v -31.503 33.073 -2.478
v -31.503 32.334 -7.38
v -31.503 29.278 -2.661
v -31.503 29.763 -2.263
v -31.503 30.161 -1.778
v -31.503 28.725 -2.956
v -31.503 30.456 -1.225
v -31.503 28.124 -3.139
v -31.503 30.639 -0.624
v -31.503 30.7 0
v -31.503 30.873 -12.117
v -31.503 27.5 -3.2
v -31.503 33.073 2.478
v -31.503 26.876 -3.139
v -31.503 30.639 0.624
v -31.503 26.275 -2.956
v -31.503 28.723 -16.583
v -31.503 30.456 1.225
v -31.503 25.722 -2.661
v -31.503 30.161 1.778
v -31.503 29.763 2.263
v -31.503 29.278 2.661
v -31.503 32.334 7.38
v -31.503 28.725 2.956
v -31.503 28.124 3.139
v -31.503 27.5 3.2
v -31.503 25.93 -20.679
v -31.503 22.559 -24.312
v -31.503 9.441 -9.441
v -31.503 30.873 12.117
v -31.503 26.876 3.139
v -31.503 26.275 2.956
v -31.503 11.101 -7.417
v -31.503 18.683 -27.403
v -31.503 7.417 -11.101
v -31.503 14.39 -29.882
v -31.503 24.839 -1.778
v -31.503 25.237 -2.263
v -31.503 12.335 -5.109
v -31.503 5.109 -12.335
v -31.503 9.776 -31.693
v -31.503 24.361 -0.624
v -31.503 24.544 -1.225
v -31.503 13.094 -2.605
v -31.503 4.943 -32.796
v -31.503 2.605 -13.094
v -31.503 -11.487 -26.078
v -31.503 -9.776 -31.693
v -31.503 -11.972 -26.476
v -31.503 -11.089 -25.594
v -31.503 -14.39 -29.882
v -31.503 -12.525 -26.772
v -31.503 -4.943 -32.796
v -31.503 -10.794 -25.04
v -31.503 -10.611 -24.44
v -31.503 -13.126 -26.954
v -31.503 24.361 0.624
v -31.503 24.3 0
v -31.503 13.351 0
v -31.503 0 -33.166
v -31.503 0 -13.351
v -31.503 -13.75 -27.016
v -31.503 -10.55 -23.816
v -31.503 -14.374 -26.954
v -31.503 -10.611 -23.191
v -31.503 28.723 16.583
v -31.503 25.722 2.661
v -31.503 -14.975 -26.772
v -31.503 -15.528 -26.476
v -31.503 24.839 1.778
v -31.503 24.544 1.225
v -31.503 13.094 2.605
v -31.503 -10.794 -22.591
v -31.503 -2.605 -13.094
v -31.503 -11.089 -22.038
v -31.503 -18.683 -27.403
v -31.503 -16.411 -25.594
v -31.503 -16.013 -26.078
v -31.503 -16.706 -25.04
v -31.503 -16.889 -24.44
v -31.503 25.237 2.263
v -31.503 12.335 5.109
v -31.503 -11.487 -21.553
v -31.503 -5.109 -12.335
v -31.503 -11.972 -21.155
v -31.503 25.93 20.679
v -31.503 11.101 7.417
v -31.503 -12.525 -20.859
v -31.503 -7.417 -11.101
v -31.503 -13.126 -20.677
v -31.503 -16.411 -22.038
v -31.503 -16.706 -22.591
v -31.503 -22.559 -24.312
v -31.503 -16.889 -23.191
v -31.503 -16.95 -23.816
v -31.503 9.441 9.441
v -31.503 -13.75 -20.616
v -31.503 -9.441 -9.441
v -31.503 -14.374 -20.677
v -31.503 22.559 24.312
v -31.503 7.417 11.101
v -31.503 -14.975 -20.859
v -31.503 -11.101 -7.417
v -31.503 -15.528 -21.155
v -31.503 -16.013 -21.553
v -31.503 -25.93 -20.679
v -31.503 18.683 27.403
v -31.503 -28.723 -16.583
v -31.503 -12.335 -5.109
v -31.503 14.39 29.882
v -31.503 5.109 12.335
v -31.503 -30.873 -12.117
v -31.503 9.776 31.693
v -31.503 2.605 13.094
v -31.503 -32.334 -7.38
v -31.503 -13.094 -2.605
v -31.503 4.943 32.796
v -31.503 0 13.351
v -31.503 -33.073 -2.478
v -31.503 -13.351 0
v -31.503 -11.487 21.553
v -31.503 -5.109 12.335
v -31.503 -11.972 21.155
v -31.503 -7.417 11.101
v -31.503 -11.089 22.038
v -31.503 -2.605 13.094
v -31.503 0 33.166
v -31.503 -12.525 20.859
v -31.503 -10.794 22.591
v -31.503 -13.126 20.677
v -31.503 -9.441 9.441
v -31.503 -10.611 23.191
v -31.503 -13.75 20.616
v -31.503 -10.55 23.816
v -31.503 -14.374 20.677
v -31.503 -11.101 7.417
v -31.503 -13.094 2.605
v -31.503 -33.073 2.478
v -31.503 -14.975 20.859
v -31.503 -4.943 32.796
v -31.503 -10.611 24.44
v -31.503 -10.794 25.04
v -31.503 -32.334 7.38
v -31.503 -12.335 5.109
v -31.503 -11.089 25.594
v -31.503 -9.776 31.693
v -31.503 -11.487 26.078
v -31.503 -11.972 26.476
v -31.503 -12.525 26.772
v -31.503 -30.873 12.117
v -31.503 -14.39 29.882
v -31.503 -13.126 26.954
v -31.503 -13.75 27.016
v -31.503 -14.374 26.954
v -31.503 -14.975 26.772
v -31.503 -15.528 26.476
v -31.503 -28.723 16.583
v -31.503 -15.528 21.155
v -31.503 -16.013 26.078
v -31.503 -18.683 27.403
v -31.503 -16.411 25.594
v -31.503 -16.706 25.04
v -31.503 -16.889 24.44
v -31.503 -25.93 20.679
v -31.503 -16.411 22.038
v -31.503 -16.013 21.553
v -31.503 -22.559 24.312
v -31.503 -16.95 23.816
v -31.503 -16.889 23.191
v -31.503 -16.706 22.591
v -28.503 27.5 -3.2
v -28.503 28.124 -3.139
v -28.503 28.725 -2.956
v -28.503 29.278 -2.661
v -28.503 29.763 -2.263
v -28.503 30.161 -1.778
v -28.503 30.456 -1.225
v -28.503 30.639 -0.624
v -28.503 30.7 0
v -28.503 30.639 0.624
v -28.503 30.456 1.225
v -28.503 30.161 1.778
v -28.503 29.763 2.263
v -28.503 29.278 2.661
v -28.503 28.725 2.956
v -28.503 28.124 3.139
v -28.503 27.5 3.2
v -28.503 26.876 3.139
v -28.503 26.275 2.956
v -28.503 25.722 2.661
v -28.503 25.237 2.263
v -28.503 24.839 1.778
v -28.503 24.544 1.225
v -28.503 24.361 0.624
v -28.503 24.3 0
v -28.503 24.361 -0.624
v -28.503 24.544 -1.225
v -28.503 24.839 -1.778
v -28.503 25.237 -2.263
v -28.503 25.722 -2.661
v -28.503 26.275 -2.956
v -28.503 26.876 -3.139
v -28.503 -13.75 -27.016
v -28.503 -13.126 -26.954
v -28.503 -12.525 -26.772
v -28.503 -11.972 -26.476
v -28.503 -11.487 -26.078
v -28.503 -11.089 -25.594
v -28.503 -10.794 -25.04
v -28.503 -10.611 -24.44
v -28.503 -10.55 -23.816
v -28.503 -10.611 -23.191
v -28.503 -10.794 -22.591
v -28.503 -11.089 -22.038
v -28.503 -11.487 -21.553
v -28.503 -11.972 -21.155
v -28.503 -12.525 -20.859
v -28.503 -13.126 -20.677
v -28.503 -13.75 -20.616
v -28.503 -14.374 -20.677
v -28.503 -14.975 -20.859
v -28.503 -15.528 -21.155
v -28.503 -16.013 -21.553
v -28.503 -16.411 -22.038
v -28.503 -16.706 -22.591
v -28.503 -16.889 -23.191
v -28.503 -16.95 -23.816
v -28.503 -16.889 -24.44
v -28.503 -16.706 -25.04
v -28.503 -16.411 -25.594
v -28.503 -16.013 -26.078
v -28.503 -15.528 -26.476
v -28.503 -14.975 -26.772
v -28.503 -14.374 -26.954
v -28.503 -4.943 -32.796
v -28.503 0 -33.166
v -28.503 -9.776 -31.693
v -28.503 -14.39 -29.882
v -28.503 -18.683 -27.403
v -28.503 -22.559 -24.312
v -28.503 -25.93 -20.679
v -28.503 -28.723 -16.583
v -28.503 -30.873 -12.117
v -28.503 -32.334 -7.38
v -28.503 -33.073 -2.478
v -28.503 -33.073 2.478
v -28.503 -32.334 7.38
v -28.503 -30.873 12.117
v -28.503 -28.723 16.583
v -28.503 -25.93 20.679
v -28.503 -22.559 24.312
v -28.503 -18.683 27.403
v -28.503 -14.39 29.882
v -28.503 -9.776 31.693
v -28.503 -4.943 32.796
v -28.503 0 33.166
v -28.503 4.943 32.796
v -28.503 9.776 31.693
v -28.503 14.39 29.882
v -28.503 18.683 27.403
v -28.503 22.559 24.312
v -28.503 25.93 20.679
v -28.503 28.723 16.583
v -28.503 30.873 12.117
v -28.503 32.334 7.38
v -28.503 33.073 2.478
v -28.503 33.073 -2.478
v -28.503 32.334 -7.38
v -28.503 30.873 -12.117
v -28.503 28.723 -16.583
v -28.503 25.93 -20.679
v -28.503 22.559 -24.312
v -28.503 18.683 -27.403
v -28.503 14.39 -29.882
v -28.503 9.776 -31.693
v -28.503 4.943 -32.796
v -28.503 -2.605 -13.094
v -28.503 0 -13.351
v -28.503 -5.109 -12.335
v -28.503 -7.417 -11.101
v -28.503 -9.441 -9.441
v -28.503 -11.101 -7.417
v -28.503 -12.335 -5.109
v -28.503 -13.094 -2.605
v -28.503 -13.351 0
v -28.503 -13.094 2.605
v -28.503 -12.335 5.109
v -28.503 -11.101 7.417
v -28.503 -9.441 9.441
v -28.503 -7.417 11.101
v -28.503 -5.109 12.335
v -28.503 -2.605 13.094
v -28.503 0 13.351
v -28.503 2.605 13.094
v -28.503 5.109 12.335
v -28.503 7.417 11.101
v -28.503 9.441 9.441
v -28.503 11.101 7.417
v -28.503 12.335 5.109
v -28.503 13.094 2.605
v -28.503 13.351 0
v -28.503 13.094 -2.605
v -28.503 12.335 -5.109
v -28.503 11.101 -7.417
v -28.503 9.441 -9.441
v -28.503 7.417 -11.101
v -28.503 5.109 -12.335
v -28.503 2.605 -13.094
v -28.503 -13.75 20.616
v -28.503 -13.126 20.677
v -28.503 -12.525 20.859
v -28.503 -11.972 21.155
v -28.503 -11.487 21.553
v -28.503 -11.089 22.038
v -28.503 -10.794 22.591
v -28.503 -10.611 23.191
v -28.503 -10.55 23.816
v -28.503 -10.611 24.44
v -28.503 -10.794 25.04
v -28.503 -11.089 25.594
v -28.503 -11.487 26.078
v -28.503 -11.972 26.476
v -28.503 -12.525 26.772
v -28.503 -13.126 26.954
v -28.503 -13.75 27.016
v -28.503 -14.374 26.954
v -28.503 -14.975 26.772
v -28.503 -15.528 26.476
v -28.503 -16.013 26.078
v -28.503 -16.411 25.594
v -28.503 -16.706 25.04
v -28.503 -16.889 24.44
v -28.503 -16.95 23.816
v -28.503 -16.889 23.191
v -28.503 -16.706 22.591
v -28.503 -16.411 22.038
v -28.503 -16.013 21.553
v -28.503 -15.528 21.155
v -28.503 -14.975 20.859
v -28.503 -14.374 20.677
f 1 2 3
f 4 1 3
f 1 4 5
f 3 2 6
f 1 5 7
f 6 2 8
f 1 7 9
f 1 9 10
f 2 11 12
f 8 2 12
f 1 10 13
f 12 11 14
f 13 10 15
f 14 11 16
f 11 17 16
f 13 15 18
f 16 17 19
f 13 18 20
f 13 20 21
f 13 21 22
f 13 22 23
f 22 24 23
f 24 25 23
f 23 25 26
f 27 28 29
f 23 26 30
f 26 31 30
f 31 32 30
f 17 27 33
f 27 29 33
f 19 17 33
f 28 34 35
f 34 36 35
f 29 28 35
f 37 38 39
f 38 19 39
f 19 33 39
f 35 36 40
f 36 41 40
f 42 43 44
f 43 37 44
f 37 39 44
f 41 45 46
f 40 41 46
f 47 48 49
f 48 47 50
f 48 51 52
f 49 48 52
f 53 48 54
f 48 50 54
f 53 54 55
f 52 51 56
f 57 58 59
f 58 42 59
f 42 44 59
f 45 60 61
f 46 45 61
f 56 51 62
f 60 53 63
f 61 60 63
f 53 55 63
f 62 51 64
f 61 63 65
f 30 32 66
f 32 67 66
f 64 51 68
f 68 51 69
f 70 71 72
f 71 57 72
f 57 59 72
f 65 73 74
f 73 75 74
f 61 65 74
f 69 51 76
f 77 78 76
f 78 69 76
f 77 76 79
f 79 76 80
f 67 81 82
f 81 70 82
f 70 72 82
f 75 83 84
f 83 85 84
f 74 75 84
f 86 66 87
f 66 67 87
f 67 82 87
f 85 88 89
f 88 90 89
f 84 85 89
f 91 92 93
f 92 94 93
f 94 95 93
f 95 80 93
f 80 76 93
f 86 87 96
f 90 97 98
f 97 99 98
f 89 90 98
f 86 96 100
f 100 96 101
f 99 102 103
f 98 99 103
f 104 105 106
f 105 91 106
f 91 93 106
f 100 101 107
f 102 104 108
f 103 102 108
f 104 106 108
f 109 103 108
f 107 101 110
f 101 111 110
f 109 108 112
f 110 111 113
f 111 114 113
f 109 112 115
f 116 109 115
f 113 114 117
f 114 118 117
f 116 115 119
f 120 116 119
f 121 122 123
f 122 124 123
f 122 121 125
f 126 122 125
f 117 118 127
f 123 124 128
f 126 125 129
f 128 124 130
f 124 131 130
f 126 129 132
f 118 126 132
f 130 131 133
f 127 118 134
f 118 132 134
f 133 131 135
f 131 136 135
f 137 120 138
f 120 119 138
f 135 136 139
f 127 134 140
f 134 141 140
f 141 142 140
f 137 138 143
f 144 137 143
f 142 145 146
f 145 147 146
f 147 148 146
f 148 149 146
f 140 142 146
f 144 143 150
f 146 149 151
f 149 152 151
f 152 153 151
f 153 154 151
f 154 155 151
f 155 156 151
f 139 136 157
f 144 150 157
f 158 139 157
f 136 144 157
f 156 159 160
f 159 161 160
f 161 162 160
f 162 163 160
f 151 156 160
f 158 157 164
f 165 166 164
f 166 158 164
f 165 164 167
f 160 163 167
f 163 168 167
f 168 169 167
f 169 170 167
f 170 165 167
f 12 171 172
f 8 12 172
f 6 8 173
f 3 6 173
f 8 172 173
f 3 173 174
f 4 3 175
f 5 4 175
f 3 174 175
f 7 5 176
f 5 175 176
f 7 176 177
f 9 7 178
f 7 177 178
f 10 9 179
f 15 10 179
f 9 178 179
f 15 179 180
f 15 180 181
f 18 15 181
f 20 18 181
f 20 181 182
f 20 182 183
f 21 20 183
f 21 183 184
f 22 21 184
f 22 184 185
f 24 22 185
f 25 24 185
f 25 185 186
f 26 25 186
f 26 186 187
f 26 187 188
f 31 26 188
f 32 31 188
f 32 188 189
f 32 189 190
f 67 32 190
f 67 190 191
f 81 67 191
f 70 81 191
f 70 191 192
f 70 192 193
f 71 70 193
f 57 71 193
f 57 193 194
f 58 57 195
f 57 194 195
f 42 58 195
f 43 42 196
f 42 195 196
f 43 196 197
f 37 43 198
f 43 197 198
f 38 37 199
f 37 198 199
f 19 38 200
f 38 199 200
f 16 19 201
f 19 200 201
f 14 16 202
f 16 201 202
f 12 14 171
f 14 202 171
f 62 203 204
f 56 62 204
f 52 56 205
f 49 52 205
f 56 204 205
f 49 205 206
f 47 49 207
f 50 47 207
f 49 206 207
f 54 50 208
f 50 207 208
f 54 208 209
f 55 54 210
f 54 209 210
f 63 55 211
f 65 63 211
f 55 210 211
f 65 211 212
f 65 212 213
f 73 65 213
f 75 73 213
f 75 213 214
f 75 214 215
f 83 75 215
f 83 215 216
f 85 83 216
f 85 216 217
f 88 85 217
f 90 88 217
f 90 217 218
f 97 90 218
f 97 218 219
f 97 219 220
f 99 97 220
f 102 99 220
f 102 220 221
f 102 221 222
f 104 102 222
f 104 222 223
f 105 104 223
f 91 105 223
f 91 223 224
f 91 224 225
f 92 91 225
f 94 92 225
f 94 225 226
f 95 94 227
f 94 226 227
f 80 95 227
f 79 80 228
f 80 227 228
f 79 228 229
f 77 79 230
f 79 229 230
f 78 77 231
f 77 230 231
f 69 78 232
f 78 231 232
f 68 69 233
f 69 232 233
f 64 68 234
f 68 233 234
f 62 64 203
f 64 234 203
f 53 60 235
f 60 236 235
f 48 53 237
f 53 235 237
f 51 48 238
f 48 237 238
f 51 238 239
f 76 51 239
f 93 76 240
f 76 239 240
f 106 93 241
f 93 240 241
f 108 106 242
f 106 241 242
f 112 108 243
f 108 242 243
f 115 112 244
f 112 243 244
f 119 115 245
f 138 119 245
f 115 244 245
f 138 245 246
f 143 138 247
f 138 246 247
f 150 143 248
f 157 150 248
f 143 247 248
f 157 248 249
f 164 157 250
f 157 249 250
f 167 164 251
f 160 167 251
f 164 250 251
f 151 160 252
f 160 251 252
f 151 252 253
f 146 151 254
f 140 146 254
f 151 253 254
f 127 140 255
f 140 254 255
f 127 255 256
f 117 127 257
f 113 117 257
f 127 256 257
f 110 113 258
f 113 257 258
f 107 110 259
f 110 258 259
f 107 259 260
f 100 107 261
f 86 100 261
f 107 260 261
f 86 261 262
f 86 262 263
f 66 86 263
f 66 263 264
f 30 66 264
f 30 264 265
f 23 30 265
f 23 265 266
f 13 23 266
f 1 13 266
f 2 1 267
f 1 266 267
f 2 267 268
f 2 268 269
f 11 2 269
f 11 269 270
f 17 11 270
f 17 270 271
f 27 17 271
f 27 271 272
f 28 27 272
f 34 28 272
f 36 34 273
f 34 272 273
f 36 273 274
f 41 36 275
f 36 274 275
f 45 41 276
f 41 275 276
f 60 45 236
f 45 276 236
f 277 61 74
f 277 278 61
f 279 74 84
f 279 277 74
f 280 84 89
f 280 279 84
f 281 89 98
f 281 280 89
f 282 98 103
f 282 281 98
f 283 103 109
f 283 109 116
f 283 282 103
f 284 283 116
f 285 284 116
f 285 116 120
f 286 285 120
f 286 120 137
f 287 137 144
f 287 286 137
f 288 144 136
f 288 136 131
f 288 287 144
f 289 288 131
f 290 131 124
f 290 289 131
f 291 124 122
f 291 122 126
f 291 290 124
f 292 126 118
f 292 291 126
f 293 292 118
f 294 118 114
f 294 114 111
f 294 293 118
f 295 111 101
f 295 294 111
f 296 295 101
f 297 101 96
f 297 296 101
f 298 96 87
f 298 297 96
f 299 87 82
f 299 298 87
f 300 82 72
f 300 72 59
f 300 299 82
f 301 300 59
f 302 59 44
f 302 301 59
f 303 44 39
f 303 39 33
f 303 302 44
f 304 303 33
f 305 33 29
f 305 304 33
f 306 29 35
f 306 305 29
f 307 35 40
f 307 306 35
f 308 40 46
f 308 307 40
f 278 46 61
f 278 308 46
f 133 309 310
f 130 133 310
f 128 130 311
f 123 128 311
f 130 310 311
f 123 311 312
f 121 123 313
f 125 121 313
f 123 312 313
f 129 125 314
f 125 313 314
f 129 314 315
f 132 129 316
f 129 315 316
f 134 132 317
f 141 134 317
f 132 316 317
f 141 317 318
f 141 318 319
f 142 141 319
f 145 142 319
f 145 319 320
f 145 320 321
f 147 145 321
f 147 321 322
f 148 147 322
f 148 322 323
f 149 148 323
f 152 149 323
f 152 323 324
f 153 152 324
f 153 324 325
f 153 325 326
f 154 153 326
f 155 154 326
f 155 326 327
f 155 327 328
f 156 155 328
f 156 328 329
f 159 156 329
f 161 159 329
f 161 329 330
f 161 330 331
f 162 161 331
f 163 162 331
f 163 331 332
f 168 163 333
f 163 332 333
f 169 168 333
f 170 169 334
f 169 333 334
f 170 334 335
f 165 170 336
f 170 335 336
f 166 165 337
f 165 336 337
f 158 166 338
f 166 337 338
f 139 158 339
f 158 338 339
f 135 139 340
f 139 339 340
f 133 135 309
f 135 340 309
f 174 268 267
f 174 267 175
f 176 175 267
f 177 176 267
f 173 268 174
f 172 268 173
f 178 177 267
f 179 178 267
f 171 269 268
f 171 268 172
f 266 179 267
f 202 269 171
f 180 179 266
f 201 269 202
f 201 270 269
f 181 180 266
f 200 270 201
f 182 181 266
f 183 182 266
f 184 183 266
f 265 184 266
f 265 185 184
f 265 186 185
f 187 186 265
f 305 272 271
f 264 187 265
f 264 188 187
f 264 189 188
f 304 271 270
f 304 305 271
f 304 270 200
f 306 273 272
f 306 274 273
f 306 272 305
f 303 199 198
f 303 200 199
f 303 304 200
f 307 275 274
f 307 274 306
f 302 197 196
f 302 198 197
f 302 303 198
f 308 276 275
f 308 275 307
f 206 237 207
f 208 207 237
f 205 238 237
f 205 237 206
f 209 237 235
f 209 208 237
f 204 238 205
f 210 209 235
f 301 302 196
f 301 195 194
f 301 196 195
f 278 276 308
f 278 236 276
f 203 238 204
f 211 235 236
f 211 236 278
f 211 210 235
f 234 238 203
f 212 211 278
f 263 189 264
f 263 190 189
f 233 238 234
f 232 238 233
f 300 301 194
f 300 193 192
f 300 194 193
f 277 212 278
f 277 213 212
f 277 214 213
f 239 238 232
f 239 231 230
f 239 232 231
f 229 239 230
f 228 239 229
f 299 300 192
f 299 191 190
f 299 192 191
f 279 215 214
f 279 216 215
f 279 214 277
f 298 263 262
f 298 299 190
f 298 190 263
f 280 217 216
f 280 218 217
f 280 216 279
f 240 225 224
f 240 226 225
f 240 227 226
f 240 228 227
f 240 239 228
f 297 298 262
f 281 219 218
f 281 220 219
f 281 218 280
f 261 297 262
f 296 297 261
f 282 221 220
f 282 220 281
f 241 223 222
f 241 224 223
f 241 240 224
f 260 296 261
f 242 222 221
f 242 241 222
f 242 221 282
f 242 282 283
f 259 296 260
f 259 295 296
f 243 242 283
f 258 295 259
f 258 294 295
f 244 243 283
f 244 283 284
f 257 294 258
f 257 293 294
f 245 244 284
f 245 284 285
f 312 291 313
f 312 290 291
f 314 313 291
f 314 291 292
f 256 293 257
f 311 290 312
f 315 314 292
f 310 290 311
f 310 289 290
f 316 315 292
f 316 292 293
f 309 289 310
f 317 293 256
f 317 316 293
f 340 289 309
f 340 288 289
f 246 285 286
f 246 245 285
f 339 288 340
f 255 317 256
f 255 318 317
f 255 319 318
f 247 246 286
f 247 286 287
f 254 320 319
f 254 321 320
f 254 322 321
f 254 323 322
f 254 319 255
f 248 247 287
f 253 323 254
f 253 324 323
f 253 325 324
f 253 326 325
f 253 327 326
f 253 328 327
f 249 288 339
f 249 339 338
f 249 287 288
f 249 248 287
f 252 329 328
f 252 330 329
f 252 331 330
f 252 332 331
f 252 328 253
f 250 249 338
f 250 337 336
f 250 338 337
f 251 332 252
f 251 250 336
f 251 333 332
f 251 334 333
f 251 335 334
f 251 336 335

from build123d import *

# Parameters (mm, degrees)
SZKIC1_W                   = 3
SZKIC1_H                   = 19.815
SZKIC2_R                   = 3.2
WYTNIJ_WYCI_GNI_CIE1_DEPTH = 47.999650126


with BuildPart() as part:
    # Szkic1 → Obrót2 (revolve)
    with BuildSketch(Plane.XY, mode=Mode.PRIVATE) as obr_t2_sk:
        with Locations((-30.002520162, 23.2585)):
            Rectangle(SZKIC1_W, SZKIC1_H)
    revolve(obr_t2_sk.sketch.rotate(Axis((0, 0, 0), (-1, 0, 0)), 90), axis=Axis((0, 0, 0), (-1, 0, 0)))

    # Szkic2 → Wytnij-wyciągnięcie1 (cut, through all)
    with BuildSketch(Plane(origin=(-28.502520162, 0, 0), x_dir=(0, 0, -1), z_dir=(1, 0, 0))):
        with Locations((0, 27.5)):
            Circle(SZKIC2_R)
        with Locations((23.815698604, -13.75)):
            Circle(SZKIC2_R)
        with Locations((-23.815698604, -13.75)):
            Circle(SZKIC2_R)
    extrude(amount=-WYTNIJ_WYCI_GNI_CIE1_DEPTH, mode=Mode.SUBTRACT)


solid = part.part
